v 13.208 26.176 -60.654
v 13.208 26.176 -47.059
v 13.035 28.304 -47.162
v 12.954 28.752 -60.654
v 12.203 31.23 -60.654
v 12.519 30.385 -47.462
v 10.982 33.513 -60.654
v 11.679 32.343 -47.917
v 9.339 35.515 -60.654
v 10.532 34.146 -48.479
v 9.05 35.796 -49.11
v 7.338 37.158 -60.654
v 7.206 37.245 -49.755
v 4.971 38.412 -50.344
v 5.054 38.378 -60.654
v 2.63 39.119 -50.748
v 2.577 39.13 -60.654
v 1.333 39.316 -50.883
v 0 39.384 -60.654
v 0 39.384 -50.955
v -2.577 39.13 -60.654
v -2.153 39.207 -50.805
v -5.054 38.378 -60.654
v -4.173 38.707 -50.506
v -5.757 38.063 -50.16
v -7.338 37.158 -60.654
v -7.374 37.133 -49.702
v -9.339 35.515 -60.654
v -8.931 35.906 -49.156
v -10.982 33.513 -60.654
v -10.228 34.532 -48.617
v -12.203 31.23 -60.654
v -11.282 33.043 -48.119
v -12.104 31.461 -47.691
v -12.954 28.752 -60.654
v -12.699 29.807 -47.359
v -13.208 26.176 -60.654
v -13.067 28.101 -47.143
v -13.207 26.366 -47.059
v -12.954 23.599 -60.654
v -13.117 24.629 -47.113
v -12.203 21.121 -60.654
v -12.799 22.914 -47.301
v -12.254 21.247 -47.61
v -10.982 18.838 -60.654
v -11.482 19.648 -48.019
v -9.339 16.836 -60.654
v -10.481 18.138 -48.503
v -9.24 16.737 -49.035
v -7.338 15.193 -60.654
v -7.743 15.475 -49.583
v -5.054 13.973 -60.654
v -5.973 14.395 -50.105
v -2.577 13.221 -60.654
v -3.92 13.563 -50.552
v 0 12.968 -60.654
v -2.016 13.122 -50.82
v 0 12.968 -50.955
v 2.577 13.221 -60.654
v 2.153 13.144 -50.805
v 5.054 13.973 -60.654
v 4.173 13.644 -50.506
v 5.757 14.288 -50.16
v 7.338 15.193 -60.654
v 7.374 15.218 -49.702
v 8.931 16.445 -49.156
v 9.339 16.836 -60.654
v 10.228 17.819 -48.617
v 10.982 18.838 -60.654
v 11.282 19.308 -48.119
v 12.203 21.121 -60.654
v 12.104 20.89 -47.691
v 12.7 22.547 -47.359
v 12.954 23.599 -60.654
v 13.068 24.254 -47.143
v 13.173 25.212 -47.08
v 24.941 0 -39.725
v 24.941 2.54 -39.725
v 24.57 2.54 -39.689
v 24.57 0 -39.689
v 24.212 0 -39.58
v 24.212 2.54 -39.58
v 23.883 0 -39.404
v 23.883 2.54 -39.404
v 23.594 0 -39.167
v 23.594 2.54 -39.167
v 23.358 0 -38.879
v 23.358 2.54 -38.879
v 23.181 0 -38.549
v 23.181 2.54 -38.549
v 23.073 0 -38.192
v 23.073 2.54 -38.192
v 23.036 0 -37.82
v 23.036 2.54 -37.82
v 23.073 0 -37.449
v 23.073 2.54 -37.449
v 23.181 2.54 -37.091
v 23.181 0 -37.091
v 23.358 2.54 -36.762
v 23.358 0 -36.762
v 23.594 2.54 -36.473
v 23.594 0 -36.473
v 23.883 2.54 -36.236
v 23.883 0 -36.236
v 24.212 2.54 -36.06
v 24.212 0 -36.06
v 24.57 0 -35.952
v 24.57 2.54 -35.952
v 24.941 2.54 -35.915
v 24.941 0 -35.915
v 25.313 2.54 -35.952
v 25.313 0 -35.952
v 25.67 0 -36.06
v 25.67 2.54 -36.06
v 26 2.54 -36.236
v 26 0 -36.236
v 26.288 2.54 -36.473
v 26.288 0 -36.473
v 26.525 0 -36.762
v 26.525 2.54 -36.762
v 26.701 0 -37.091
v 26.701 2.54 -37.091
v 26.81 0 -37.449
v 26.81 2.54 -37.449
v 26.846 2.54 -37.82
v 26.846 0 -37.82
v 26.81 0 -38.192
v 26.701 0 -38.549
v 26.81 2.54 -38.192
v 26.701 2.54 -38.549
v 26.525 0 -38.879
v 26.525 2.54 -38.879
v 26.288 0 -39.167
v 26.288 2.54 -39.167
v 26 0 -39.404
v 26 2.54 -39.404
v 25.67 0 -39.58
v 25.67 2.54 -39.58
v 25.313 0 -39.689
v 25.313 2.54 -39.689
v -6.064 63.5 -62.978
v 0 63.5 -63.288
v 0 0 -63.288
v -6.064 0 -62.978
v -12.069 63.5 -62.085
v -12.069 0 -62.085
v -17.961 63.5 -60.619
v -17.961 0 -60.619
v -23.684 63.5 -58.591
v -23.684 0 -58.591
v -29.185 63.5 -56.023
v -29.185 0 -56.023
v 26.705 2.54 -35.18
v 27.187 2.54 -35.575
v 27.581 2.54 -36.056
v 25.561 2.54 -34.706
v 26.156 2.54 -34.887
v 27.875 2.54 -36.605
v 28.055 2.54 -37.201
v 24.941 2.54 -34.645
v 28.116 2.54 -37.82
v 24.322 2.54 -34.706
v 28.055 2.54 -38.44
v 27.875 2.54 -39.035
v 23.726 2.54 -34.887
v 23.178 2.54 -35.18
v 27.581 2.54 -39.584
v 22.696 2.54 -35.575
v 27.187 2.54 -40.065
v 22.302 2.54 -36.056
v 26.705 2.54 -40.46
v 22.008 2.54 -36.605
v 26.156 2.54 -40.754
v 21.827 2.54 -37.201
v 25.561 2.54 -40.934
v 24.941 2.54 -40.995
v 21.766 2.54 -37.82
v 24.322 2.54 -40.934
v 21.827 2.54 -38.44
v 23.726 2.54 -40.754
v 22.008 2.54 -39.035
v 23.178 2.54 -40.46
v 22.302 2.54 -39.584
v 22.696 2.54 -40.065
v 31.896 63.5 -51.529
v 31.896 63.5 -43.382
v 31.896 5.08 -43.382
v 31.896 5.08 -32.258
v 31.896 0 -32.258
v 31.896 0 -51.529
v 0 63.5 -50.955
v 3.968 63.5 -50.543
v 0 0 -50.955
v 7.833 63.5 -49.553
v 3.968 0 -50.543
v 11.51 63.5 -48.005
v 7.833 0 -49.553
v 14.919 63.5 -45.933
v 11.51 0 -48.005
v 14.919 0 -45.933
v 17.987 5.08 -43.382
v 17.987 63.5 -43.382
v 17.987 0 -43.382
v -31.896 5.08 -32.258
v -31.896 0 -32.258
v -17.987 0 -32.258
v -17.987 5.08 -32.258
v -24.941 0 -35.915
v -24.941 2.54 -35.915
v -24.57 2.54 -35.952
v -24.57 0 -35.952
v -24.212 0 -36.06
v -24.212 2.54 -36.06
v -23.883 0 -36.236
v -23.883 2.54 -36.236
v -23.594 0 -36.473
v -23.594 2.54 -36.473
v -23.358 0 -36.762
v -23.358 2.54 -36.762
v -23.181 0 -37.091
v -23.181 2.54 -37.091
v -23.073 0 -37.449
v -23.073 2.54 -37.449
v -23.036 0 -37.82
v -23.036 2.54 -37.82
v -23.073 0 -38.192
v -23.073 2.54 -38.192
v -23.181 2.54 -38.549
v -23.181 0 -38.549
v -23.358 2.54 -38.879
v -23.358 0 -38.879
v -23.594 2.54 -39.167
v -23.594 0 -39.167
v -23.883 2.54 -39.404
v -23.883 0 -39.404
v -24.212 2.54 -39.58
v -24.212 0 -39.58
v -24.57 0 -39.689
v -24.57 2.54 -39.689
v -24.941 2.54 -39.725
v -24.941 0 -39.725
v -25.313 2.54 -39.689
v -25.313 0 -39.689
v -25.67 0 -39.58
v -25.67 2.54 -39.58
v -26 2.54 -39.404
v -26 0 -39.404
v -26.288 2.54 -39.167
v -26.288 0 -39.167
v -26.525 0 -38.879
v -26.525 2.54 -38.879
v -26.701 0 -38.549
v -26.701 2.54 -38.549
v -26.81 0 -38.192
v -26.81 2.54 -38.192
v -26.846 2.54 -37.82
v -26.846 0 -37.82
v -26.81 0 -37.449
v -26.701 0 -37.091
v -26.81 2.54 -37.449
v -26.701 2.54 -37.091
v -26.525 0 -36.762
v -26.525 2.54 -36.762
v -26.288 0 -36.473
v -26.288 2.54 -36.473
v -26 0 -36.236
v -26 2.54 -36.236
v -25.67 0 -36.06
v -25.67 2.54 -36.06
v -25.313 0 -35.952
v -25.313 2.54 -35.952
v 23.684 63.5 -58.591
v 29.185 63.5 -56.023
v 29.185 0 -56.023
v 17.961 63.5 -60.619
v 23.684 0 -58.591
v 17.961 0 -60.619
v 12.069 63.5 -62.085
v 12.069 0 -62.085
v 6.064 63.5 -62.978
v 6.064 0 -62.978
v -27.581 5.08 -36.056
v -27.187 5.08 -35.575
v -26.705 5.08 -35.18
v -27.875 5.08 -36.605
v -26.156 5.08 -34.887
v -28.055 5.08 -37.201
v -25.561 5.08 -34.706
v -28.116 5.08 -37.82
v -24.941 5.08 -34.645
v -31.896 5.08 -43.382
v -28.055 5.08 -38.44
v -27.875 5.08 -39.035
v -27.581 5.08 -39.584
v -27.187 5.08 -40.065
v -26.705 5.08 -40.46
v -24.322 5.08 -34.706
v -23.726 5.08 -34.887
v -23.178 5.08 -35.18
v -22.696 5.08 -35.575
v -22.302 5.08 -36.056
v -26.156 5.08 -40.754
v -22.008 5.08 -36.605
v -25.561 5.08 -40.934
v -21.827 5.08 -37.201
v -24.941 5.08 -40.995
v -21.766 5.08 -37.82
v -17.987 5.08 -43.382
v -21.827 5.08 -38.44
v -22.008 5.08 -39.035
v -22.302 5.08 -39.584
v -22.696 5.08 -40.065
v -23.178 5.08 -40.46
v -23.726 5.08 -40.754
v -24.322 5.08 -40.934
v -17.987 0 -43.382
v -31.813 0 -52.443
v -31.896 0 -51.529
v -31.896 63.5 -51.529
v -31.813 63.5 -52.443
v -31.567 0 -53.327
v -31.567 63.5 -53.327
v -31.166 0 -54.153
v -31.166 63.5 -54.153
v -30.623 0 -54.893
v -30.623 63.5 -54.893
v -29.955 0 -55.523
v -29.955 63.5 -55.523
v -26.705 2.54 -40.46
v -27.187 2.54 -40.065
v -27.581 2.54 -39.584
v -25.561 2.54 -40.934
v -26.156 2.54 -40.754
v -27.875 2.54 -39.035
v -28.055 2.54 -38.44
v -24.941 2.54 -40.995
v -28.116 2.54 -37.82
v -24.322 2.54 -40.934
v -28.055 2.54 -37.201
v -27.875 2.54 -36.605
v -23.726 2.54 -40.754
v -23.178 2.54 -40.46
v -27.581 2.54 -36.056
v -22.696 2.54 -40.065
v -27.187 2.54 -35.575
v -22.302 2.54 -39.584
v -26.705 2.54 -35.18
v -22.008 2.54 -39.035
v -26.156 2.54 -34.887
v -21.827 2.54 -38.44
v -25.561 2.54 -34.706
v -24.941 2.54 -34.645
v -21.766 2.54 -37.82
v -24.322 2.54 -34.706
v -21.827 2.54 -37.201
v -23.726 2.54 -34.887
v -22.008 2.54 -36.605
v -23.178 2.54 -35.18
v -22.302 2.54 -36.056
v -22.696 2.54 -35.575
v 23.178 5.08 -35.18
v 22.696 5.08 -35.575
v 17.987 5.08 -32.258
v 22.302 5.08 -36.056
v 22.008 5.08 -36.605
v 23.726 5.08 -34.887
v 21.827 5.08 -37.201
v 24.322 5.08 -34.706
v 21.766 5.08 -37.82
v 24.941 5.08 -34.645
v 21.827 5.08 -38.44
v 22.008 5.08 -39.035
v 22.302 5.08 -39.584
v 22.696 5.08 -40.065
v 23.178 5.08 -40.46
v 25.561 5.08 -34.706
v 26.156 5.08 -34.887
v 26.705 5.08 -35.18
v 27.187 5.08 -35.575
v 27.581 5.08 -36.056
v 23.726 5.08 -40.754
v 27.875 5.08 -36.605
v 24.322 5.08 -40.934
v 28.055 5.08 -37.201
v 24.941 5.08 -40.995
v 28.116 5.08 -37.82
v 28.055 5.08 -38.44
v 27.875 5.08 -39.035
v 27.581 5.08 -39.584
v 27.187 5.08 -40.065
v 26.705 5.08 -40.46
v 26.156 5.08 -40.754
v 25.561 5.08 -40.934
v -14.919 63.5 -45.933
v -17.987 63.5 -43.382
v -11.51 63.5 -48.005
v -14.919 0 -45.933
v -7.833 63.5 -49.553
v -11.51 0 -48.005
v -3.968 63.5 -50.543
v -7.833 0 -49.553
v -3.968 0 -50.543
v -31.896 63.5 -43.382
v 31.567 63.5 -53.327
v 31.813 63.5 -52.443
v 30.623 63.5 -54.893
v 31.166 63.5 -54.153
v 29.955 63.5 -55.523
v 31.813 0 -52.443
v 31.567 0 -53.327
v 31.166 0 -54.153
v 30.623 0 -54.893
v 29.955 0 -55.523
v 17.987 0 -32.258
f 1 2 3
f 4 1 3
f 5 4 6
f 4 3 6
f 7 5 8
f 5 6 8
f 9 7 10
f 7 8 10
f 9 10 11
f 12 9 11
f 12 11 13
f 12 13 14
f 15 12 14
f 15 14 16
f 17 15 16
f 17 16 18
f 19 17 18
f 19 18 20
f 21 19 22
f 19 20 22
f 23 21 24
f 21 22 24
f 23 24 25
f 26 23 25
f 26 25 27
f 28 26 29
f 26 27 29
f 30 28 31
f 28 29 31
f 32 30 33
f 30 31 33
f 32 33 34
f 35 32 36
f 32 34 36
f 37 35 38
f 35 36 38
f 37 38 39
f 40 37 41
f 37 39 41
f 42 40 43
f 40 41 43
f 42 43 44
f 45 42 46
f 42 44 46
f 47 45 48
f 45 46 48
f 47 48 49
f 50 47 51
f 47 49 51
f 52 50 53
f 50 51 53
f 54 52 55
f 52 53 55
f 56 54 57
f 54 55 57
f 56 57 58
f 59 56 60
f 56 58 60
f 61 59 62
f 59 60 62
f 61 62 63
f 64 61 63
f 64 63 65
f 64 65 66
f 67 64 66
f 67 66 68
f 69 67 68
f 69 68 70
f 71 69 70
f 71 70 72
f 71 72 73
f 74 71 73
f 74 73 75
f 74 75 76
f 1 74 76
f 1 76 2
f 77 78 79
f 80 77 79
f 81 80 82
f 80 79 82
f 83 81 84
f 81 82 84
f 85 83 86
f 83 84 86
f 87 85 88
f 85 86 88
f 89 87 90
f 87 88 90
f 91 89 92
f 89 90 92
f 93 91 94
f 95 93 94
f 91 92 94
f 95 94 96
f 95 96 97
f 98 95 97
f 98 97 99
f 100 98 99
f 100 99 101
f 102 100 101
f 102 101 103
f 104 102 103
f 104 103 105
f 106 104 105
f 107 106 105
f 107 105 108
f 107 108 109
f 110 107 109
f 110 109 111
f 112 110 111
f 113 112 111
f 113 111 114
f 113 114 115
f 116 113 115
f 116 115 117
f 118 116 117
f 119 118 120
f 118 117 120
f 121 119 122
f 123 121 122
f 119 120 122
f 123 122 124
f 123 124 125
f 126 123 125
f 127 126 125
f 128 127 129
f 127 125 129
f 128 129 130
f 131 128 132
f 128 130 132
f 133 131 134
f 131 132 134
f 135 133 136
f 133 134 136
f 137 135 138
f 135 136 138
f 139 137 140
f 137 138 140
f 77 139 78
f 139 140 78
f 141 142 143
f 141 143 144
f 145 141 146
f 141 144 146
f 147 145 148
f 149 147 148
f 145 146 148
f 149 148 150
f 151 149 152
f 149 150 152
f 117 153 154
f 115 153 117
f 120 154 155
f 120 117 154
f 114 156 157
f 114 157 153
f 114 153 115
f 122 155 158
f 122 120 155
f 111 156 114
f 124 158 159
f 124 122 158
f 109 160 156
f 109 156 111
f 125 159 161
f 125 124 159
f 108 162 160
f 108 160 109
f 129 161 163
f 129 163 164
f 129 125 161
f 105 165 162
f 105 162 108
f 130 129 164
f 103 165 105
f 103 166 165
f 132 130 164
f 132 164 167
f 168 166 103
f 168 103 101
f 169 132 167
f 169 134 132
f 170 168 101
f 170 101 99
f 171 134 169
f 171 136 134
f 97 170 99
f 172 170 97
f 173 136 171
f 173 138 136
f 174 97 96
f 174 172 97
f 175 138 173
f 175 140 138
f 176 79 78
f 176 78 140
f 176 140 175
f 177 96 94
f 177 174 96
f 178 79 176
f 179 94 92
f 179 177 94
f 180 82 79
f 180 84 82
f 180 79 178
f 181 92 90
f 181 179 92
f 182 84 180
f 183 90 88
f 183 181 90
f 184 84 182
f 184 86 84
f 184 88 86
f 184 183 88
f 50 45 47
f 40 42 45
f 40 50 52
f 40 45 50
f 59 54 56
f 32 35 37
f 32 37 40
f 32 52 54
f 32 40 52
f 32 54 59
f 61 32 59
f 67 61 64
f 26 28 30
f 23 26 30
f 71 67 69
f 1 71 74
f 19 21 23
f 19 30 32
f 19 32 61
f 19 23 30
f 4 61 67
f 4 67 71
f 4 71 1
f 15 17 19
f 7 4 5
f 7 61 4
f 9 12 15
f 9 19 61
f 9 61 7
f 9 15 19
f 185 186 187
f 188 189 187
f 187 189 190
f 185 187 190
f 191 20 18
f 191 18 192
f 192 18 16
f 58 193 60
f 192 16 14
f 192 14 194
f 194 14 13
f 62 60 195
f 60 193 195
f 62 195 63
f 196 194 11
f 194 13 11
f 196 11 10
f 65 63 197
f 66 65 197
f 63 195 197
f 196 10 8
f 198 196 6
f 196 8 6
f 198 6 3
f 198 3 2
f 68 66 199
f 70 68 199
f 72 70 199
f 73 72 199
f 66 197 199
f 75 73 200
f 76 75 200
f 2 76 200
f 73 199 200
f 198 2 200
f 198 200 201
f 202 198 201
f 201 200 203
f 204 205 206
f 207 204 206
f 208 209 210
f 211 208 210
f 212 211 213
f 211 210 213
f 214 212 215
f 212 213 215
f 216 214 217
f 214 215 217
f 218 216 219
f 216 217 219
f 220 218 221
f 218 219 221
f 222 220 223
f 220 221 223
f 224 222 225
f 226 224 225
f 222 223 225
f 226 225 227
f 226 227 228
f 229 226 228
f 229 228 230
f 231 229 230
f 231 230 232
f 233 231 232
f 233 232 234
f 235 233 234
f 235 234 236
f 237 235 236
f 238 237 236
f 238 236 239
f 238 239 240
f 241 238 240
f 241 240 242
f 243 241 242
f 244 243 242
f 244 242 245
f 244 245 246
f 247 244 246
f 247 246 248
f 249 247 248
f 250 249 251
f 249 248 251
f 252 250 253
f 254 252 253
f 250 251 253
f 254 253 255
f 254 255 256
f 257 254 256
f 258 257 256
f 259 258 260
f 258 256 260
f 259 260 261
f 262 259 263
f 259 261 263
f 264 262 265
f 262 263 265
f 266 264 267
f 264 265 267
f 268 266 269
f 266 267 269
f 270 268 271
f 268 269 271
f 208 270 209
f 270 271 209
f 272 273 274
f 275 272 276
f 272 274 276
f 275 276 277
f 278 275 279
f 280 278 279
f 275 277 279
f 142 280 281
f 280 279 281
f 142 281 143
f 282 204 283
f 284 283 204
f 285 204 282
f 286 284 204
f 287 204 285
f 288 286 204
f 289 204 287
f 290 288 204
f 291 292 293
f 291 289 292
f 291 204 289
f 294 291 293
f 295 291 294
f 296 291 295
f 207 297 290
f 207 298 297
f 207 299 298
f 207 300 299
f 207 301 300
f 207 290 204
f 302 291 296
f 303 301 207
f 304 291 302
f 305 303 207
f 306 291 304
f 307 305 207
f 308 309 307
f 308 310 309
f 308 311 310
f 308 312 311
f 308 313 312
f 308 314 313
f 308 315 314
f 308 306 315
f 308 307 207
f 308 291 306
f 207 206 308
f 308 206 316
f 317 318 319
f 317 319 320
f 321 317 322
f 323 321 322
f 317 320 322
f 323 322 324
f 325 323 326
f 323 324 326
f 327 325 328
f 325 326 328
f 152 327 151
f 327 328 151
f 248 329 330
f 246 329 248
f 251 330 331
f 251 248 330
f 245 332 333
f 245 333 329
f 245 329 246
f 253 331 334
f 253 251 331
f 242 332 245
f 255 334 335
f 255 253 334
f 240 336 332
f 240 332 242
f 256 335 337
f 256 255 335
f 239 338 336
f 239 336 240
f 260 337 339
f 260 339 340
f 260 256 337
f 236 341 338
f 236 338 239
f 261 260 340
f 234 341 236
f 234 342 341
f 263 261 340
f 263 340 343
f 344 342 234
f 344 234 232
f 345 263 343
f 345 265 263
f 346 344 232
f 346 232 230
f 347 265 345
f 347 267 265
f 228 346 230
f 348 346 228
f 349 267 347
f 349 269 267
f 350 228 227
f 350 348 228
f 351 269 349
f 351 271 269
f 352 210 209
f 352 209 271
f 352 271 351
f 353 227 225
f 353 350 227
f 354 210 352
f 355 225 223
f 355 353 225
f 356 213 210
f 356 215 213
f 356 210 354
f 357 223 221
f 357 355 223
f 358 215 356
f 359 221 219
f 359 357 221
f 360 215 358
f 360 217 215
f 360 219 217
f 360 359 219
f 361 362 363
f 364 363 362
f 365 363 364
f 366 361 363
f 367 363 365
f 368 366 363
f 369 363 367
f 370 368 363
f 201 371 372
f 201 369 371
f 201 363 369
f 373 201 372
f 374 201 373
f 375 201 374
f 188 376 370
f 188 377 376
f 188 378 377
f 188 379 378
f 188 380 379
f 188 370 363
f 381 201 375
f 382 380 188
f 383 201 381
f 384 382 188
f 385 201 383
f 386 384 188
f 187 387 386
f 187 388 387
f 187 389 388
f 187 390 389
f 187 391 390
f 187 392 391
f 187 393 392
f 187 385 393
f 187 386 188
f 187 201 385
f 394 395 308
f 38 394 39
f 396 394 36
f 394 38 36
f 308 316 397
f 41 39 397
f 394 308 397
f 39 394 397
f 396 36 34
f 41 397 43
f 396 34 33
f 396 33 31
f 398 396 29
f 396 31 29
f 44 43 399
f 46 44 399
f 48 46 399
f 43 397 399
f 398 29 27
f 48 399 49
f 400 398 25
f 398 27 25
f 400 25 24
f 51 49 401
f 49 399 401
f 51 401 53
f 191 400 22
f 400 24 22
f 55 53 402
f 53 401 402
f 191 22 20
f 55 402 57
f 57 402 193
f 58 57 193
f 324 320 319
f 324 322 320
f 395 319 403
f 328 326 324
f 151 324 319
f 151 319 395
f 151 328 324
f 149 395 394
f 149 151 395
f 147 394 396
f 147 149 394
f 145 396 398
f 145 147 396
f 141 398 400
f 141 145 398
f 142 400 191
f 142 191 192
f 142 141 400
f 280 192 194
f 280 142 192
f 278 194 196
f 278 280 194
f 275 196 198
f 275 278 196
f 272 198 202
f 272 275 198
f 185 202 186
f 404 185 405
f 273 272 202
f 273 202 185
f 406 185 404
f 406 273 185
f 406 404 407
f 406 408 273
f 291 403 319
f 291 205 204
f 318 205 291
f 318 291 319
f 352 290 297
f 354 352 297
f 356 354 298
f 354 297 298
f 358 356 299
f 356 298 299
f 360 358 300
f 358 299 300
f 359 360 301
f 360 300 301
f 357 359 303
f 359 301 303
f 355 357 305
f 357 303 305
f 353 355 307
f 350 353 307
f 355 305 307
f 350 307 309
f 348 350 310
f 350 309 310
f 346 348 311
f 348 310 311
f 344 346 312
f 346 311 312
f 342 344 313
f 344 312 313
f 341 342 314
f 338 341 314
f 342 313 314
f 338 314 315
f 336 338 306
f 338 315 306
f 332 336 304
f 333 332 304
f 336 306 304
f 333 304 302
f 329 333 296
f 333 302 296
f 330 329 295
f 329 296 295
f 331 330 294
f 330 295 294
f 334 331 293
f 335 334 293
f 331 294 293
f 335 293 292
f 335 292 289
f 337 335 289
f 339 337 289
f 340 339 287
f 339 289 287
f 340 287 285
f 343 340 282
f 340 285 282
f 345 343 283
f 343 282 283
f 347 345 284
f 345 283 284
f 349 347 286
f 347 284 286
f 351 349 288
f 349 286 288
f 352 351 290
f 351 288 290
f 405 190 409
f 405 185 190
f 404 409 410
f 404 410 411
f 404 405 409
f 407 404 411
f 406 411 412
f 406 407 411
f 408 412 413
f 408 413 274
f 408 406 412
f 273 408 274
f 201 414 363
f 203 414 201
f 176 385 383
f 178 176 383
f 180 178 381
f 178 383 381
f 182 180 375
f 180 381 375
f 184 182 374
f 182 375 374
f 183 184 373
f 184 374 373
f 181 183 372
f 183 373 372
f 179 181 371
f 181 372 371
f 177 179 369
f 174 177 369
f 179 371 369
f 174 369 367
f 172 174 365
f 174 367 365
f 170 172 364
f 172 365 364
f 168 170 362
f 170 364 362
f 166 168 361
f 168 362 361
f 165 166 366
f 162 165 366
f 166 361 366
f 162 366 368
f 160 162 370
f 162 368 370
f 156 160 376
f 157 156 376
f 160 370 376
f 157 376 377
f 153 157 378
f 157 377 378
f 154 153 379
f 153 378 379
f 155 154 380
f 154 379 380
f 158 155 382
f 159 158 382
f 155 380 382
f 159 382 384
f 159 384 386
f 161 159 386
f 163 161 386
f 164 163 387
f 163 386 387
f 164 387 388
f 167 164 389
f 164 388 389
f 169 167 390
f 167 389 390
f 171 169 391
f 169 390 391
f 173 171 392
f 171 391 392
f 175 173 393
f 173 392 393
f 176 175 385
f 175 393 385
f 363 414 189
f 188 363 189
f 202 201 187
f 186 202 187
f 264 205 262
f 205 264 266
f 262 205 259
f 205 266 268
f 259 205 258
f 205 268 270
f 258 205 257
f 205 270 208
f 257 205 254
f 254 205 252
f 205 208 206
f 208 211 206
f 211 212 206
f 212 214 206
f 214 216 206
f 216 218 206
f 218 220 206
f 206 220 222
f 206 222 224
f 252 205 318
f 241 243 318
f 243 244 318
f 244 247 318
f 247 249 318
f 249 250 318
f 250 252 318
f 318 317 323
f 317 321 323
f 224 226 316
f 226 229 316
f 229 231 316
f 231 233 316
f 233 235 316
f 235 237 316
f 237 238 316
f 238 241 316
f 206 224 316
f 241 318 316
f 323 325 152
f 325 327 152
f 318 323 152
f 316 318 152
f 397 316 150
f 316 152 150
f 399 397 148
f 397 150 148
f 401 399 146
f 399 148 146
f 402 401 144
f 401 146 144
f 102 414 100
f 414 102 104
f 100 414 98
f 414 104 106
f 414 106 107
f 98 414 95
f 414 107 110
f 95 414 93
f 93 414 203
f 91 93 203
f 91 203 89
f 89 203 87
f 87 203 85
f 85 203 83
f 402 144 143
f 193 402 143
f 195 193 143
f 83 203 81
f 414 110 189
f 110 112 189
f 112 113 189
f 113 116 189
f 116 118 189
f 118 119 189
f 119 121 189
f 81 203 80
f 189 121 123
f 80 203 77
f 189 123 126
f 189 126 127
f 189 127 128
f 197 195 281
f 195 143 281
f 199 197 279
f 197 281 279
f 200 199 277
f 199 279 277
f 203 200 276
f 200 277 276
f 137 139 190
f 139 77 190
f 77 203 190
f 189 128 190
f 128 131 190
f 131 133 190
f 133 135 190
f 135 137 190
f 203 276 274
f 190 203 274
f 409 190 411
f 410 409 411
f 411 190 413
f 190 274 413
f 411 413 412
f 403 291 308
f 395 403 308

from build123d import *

# Parameters (mm, degrees)
BOSS_EXTRUDE2_DEPTH = 63.5
SKETCH1_4_W         = 13.909610768
SKETCH1_4_H         = 11.124423297
BOSS_EXTRUDE3_DEPTH = 5.08
SKETCH2_R           = 3.175
CUT_EXTRUDE1_DEPTH  = 2.54
SKETCH3_R           = 1.905
CUT_EXTRUDE2_DEPTH  = 94.48175649
CUT_EXTRUDE3_START  = -43.382423
SKETCH4_R           = 13.208
CUT_EXTRUDE3_DEPTH  = 17.272
FILLET1_R           = 5.08


with BuildPart() as part:
    # Sketch1 → Boss-Extrude2 (new body)
    with BuildSketch(Plane(origin=(0, 0, 0), x_dir=(1, 0, 0), z_dir=(0, 1, 0))):
        with BuildLine():
            ThreePointArc((0, 63.287802336), (-16.535030554, 61.029206749), (-31.896257962, 54.506846594))
            Line((-31.896257962, 54.506846594), (-31.896257962, 43.382423297))
            Line((-31.896257962, 43.382423297), (-17.986647194, 43.382423297))
            ThreePointArc((-17.986647194, 43.382423297), (-9.699677374, 48.846444583), (0, 50.954917077))
            ThreePointArc((0, 50.954917077), (9.699677374, 48.846444583), (17.986647194, 43.382423297))
            Line((17.986647194, 43.382423297), (31.896257962, 43.382423297))
            Line((31.896257962, 43.382423297), (31.896257962, 54.506846594))
            ThreePointArc((31.896257962, 54.506846594), (16.535030554, 61.029206749), (0, 63.287802336))
        make_face()
    extrude(amount=BOSS_EXTRUDE2_DEPTH)

    # Sketch1<4> → Boss-Extrude3 (add)
    with BuildSketch(Plane(origin=(0, 0, 0), x_dir=(1, 0, 0), z_dir=(0, 1, 0))):
        with Locations((-24.941452578, 37.820211649)):
            Rectangle(SKETCH1_4_W, SKETCH1_4_H)
        with Locations((24.941452578, 37.820211649)):
            Rectangle(SKETCH1_4_W, SKETCH1_4_H)
    extrude(amount=BOSS_EXTRUDE3_DEPTH)

    # Sketch2 → Cut-Extrude1 (cut)
    with BuildSketch(Plane(origin=(0, 5.08, 0), x_dir=(1, 0, 0), z_dir=(0, 1, 0))):
        with Locations(Location((-24.941452578, 37.820211648, 0), (0, 0, 270))):
            Circle(SKETCH2_R)
        with Locations(Location((24.941452578, 37.820211648, 0), (0, 0, 90))):
            Circle(SKETCH2_R)
    extrude(amount=-CUT_EXTRUDE1_DEPTH, mode=Mode.SUBTRACT)

    # Sketch3 → Cut-Extrude2 (cut, through all)
    with BuildSketch(Plane(origin=(0, 2.54, 0), x_dir=(1, 0, 0), z_dir=(0, 1, 0))):
        with Locations(Location((-24.941452578, 37.820211648, 0), (0, 0, 270))):
            Circle(SKETCH3_R)
        with Locations(Location((24.941452578, 37.820211648, 0), (0, 0, 90))):
            Circle(SKETCH3_R)
    extrude(amount=-CUT_EXTRUDE2_DEPTH, mode=Mode.SUBTRACT)

    # Sketch4 → Cut-Extrude3 (cut)
    with BuildSketch(Plane.XY.offset(CUT_EXTRUDE3_START)):
        with Locations((0, 26.175500537)):
            Circle(SKETCH4_R)
    extrude(amount=-CUT_EXTRUDE3_DEPTH, mode=Mode.SUBTRACT)

    # Fillet1
    fillet1_edges = [part.edges().sort_by_distance(p)[0] for p in [
        (31.896257962, 31.75, -54.506846594),
        (-31.896257962, 31.75, -54.506846594),
    ]]
    fillet(fillet1_edges, radius=FILLET1_R)


solid = part.part
